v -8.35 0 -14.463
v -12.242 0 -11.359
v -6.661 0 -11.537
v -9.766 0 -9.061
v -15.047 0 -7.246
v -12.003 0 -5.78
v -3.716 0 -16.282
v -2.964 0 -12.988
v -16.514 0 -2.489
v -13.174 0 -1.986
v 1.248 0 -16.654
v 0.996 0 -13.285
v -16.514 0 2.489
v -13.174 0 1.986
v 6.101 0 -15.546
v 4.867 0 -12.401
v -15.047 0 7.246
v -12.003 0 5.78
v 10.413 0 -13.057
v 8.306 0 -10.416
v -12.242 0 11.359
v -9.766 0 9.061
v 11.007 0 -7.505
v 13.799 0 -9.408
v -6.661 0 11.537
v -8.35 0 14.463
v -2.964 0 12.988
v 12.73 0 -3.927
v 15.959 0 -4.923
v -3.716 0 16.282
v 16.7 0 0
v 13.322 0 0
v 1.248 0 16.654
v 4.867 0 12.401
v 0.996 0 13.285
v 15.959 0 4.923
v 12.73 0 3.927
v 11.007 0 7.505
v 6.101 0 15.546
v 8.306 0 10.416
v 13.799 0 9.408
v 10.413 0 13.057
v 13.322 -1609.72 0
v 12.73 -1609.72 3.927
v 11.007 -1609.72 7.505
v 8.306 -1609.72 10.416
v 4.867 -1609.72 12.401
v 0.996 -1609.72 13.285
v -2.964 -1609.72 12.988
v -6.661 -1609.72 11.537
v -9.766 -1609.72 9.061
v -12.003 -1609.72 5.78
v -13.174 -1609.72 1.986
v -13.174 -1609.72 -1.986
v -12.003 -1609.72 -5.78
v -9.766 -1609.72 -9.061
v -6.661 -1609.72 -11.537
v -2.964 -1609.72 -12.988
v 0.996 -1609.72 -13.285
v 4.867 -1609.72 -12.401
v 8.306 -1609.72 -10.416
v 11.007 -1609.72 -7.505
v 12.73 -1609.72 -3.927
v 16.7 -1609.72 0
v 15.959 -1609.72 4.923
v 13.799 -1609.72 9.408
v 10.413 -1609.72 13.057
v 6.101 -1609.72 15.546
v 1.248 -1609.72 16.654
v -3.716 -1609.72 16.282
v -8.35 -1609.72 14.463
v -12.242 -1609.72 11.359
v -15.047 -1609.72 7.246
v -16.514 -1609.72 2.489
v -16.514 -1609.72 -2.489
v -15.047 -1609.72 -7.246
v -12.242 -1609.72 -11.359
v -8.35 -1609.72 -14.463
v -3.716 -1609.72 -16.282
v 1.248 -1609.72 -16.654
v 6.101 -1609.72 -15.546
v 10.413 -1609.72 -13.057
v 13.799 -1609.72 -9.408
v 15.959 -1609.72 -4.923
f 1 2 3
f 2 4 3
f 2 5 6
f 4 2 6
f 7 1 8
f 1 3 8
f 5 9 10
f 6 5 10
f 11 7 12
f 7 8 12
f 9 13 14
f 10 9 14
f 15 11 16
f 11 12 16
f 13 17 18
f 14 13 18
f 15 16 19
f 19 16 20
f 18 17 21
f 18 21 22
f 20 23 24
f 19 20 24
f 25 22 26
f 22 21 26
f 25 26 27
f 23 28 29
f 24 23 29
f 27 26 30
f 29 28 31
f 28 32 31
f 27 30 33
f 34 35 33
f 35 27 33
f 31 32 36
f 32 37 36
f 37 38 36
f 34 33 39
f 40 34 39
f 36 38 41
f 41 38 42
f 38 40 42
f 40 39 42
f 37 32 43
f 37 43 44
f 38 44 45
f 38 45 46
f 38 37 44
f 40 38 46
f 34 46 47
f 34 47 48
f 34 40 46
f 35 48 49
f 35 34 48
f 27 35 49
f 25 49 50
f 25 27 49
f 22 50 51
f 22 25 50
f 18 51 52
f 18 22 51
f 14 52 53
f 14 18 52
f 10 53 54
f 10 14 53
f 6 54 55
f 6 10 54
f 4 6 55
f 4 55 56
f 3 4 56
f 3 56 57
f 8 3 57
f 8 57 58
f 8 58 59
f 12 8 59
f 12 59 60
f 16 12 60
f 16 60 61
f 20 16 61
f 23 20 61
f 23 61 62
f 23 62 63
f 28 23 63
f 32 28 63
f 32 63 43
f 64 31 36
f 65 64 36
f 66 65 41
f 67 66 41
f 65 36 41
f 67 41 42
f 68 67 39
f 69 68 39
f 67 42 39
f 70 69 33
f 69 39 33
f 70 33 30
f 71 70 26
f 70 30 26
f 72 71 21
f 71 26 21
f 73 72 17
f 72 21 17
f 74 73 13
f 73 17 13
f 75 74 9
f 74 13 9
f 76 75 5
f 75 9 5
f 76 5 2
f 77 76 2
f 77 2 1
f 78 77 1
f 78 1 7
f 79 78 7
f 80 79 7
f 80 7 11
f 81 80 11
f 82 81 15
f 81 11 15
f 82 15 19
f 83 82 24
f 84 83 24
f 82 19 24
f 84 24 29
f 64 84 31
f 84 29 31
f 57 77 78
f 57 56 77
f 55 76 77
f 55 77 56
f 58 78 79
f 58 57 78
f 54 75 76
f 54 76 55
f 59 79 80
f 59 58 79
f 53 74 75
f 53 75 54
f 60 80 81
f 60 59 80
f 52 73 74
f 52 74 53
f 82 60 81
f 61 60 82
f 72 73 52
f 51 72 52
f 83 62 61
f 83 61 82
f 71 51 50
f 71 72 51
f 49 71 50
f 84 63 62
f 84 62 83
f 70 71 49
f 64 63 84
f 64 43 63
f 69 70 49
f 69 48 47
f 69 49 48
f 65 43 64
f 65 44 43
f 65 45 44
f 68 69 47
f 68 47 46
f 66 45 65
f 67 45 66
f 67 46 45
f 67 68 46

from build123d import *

# Parameters (mm, degrees)
CYLINDER_R          = 16.7005
CYLINDER_DEPTH      = 1609.72
CYLINDER_ROLL_ANGLE = 90
THICKNESS001_T      = -3.3782


with BuildPart() as part:
    # Cylinder → Cylinder (new body)
    with BuildSketch(Plane.XY):
        Circle(CYLINDER_R)
    extrude(amount=CYLINDER_DEPTH)


with BuildPart() as part_1:
    # Cylinder roll: moved
    add(part.part.rotate(Axis((0, 0, 0), (1, 0, 0)), CYLINDER_ROLL_ANGLE))


with BuildPart() as part_2:
    # Cylinder placement: moved
    add(part_1.part)

    # Thickness001
    thickness001_openings = [part_2.faces().sort_by_distance(p)[0] for p in [
        (0, 0, 0),
        (0, -1609.72, 0),
    ]]
    offset(amount=THICKNESS001_T, openings=thickness001_openings)


solid = part_2.part
